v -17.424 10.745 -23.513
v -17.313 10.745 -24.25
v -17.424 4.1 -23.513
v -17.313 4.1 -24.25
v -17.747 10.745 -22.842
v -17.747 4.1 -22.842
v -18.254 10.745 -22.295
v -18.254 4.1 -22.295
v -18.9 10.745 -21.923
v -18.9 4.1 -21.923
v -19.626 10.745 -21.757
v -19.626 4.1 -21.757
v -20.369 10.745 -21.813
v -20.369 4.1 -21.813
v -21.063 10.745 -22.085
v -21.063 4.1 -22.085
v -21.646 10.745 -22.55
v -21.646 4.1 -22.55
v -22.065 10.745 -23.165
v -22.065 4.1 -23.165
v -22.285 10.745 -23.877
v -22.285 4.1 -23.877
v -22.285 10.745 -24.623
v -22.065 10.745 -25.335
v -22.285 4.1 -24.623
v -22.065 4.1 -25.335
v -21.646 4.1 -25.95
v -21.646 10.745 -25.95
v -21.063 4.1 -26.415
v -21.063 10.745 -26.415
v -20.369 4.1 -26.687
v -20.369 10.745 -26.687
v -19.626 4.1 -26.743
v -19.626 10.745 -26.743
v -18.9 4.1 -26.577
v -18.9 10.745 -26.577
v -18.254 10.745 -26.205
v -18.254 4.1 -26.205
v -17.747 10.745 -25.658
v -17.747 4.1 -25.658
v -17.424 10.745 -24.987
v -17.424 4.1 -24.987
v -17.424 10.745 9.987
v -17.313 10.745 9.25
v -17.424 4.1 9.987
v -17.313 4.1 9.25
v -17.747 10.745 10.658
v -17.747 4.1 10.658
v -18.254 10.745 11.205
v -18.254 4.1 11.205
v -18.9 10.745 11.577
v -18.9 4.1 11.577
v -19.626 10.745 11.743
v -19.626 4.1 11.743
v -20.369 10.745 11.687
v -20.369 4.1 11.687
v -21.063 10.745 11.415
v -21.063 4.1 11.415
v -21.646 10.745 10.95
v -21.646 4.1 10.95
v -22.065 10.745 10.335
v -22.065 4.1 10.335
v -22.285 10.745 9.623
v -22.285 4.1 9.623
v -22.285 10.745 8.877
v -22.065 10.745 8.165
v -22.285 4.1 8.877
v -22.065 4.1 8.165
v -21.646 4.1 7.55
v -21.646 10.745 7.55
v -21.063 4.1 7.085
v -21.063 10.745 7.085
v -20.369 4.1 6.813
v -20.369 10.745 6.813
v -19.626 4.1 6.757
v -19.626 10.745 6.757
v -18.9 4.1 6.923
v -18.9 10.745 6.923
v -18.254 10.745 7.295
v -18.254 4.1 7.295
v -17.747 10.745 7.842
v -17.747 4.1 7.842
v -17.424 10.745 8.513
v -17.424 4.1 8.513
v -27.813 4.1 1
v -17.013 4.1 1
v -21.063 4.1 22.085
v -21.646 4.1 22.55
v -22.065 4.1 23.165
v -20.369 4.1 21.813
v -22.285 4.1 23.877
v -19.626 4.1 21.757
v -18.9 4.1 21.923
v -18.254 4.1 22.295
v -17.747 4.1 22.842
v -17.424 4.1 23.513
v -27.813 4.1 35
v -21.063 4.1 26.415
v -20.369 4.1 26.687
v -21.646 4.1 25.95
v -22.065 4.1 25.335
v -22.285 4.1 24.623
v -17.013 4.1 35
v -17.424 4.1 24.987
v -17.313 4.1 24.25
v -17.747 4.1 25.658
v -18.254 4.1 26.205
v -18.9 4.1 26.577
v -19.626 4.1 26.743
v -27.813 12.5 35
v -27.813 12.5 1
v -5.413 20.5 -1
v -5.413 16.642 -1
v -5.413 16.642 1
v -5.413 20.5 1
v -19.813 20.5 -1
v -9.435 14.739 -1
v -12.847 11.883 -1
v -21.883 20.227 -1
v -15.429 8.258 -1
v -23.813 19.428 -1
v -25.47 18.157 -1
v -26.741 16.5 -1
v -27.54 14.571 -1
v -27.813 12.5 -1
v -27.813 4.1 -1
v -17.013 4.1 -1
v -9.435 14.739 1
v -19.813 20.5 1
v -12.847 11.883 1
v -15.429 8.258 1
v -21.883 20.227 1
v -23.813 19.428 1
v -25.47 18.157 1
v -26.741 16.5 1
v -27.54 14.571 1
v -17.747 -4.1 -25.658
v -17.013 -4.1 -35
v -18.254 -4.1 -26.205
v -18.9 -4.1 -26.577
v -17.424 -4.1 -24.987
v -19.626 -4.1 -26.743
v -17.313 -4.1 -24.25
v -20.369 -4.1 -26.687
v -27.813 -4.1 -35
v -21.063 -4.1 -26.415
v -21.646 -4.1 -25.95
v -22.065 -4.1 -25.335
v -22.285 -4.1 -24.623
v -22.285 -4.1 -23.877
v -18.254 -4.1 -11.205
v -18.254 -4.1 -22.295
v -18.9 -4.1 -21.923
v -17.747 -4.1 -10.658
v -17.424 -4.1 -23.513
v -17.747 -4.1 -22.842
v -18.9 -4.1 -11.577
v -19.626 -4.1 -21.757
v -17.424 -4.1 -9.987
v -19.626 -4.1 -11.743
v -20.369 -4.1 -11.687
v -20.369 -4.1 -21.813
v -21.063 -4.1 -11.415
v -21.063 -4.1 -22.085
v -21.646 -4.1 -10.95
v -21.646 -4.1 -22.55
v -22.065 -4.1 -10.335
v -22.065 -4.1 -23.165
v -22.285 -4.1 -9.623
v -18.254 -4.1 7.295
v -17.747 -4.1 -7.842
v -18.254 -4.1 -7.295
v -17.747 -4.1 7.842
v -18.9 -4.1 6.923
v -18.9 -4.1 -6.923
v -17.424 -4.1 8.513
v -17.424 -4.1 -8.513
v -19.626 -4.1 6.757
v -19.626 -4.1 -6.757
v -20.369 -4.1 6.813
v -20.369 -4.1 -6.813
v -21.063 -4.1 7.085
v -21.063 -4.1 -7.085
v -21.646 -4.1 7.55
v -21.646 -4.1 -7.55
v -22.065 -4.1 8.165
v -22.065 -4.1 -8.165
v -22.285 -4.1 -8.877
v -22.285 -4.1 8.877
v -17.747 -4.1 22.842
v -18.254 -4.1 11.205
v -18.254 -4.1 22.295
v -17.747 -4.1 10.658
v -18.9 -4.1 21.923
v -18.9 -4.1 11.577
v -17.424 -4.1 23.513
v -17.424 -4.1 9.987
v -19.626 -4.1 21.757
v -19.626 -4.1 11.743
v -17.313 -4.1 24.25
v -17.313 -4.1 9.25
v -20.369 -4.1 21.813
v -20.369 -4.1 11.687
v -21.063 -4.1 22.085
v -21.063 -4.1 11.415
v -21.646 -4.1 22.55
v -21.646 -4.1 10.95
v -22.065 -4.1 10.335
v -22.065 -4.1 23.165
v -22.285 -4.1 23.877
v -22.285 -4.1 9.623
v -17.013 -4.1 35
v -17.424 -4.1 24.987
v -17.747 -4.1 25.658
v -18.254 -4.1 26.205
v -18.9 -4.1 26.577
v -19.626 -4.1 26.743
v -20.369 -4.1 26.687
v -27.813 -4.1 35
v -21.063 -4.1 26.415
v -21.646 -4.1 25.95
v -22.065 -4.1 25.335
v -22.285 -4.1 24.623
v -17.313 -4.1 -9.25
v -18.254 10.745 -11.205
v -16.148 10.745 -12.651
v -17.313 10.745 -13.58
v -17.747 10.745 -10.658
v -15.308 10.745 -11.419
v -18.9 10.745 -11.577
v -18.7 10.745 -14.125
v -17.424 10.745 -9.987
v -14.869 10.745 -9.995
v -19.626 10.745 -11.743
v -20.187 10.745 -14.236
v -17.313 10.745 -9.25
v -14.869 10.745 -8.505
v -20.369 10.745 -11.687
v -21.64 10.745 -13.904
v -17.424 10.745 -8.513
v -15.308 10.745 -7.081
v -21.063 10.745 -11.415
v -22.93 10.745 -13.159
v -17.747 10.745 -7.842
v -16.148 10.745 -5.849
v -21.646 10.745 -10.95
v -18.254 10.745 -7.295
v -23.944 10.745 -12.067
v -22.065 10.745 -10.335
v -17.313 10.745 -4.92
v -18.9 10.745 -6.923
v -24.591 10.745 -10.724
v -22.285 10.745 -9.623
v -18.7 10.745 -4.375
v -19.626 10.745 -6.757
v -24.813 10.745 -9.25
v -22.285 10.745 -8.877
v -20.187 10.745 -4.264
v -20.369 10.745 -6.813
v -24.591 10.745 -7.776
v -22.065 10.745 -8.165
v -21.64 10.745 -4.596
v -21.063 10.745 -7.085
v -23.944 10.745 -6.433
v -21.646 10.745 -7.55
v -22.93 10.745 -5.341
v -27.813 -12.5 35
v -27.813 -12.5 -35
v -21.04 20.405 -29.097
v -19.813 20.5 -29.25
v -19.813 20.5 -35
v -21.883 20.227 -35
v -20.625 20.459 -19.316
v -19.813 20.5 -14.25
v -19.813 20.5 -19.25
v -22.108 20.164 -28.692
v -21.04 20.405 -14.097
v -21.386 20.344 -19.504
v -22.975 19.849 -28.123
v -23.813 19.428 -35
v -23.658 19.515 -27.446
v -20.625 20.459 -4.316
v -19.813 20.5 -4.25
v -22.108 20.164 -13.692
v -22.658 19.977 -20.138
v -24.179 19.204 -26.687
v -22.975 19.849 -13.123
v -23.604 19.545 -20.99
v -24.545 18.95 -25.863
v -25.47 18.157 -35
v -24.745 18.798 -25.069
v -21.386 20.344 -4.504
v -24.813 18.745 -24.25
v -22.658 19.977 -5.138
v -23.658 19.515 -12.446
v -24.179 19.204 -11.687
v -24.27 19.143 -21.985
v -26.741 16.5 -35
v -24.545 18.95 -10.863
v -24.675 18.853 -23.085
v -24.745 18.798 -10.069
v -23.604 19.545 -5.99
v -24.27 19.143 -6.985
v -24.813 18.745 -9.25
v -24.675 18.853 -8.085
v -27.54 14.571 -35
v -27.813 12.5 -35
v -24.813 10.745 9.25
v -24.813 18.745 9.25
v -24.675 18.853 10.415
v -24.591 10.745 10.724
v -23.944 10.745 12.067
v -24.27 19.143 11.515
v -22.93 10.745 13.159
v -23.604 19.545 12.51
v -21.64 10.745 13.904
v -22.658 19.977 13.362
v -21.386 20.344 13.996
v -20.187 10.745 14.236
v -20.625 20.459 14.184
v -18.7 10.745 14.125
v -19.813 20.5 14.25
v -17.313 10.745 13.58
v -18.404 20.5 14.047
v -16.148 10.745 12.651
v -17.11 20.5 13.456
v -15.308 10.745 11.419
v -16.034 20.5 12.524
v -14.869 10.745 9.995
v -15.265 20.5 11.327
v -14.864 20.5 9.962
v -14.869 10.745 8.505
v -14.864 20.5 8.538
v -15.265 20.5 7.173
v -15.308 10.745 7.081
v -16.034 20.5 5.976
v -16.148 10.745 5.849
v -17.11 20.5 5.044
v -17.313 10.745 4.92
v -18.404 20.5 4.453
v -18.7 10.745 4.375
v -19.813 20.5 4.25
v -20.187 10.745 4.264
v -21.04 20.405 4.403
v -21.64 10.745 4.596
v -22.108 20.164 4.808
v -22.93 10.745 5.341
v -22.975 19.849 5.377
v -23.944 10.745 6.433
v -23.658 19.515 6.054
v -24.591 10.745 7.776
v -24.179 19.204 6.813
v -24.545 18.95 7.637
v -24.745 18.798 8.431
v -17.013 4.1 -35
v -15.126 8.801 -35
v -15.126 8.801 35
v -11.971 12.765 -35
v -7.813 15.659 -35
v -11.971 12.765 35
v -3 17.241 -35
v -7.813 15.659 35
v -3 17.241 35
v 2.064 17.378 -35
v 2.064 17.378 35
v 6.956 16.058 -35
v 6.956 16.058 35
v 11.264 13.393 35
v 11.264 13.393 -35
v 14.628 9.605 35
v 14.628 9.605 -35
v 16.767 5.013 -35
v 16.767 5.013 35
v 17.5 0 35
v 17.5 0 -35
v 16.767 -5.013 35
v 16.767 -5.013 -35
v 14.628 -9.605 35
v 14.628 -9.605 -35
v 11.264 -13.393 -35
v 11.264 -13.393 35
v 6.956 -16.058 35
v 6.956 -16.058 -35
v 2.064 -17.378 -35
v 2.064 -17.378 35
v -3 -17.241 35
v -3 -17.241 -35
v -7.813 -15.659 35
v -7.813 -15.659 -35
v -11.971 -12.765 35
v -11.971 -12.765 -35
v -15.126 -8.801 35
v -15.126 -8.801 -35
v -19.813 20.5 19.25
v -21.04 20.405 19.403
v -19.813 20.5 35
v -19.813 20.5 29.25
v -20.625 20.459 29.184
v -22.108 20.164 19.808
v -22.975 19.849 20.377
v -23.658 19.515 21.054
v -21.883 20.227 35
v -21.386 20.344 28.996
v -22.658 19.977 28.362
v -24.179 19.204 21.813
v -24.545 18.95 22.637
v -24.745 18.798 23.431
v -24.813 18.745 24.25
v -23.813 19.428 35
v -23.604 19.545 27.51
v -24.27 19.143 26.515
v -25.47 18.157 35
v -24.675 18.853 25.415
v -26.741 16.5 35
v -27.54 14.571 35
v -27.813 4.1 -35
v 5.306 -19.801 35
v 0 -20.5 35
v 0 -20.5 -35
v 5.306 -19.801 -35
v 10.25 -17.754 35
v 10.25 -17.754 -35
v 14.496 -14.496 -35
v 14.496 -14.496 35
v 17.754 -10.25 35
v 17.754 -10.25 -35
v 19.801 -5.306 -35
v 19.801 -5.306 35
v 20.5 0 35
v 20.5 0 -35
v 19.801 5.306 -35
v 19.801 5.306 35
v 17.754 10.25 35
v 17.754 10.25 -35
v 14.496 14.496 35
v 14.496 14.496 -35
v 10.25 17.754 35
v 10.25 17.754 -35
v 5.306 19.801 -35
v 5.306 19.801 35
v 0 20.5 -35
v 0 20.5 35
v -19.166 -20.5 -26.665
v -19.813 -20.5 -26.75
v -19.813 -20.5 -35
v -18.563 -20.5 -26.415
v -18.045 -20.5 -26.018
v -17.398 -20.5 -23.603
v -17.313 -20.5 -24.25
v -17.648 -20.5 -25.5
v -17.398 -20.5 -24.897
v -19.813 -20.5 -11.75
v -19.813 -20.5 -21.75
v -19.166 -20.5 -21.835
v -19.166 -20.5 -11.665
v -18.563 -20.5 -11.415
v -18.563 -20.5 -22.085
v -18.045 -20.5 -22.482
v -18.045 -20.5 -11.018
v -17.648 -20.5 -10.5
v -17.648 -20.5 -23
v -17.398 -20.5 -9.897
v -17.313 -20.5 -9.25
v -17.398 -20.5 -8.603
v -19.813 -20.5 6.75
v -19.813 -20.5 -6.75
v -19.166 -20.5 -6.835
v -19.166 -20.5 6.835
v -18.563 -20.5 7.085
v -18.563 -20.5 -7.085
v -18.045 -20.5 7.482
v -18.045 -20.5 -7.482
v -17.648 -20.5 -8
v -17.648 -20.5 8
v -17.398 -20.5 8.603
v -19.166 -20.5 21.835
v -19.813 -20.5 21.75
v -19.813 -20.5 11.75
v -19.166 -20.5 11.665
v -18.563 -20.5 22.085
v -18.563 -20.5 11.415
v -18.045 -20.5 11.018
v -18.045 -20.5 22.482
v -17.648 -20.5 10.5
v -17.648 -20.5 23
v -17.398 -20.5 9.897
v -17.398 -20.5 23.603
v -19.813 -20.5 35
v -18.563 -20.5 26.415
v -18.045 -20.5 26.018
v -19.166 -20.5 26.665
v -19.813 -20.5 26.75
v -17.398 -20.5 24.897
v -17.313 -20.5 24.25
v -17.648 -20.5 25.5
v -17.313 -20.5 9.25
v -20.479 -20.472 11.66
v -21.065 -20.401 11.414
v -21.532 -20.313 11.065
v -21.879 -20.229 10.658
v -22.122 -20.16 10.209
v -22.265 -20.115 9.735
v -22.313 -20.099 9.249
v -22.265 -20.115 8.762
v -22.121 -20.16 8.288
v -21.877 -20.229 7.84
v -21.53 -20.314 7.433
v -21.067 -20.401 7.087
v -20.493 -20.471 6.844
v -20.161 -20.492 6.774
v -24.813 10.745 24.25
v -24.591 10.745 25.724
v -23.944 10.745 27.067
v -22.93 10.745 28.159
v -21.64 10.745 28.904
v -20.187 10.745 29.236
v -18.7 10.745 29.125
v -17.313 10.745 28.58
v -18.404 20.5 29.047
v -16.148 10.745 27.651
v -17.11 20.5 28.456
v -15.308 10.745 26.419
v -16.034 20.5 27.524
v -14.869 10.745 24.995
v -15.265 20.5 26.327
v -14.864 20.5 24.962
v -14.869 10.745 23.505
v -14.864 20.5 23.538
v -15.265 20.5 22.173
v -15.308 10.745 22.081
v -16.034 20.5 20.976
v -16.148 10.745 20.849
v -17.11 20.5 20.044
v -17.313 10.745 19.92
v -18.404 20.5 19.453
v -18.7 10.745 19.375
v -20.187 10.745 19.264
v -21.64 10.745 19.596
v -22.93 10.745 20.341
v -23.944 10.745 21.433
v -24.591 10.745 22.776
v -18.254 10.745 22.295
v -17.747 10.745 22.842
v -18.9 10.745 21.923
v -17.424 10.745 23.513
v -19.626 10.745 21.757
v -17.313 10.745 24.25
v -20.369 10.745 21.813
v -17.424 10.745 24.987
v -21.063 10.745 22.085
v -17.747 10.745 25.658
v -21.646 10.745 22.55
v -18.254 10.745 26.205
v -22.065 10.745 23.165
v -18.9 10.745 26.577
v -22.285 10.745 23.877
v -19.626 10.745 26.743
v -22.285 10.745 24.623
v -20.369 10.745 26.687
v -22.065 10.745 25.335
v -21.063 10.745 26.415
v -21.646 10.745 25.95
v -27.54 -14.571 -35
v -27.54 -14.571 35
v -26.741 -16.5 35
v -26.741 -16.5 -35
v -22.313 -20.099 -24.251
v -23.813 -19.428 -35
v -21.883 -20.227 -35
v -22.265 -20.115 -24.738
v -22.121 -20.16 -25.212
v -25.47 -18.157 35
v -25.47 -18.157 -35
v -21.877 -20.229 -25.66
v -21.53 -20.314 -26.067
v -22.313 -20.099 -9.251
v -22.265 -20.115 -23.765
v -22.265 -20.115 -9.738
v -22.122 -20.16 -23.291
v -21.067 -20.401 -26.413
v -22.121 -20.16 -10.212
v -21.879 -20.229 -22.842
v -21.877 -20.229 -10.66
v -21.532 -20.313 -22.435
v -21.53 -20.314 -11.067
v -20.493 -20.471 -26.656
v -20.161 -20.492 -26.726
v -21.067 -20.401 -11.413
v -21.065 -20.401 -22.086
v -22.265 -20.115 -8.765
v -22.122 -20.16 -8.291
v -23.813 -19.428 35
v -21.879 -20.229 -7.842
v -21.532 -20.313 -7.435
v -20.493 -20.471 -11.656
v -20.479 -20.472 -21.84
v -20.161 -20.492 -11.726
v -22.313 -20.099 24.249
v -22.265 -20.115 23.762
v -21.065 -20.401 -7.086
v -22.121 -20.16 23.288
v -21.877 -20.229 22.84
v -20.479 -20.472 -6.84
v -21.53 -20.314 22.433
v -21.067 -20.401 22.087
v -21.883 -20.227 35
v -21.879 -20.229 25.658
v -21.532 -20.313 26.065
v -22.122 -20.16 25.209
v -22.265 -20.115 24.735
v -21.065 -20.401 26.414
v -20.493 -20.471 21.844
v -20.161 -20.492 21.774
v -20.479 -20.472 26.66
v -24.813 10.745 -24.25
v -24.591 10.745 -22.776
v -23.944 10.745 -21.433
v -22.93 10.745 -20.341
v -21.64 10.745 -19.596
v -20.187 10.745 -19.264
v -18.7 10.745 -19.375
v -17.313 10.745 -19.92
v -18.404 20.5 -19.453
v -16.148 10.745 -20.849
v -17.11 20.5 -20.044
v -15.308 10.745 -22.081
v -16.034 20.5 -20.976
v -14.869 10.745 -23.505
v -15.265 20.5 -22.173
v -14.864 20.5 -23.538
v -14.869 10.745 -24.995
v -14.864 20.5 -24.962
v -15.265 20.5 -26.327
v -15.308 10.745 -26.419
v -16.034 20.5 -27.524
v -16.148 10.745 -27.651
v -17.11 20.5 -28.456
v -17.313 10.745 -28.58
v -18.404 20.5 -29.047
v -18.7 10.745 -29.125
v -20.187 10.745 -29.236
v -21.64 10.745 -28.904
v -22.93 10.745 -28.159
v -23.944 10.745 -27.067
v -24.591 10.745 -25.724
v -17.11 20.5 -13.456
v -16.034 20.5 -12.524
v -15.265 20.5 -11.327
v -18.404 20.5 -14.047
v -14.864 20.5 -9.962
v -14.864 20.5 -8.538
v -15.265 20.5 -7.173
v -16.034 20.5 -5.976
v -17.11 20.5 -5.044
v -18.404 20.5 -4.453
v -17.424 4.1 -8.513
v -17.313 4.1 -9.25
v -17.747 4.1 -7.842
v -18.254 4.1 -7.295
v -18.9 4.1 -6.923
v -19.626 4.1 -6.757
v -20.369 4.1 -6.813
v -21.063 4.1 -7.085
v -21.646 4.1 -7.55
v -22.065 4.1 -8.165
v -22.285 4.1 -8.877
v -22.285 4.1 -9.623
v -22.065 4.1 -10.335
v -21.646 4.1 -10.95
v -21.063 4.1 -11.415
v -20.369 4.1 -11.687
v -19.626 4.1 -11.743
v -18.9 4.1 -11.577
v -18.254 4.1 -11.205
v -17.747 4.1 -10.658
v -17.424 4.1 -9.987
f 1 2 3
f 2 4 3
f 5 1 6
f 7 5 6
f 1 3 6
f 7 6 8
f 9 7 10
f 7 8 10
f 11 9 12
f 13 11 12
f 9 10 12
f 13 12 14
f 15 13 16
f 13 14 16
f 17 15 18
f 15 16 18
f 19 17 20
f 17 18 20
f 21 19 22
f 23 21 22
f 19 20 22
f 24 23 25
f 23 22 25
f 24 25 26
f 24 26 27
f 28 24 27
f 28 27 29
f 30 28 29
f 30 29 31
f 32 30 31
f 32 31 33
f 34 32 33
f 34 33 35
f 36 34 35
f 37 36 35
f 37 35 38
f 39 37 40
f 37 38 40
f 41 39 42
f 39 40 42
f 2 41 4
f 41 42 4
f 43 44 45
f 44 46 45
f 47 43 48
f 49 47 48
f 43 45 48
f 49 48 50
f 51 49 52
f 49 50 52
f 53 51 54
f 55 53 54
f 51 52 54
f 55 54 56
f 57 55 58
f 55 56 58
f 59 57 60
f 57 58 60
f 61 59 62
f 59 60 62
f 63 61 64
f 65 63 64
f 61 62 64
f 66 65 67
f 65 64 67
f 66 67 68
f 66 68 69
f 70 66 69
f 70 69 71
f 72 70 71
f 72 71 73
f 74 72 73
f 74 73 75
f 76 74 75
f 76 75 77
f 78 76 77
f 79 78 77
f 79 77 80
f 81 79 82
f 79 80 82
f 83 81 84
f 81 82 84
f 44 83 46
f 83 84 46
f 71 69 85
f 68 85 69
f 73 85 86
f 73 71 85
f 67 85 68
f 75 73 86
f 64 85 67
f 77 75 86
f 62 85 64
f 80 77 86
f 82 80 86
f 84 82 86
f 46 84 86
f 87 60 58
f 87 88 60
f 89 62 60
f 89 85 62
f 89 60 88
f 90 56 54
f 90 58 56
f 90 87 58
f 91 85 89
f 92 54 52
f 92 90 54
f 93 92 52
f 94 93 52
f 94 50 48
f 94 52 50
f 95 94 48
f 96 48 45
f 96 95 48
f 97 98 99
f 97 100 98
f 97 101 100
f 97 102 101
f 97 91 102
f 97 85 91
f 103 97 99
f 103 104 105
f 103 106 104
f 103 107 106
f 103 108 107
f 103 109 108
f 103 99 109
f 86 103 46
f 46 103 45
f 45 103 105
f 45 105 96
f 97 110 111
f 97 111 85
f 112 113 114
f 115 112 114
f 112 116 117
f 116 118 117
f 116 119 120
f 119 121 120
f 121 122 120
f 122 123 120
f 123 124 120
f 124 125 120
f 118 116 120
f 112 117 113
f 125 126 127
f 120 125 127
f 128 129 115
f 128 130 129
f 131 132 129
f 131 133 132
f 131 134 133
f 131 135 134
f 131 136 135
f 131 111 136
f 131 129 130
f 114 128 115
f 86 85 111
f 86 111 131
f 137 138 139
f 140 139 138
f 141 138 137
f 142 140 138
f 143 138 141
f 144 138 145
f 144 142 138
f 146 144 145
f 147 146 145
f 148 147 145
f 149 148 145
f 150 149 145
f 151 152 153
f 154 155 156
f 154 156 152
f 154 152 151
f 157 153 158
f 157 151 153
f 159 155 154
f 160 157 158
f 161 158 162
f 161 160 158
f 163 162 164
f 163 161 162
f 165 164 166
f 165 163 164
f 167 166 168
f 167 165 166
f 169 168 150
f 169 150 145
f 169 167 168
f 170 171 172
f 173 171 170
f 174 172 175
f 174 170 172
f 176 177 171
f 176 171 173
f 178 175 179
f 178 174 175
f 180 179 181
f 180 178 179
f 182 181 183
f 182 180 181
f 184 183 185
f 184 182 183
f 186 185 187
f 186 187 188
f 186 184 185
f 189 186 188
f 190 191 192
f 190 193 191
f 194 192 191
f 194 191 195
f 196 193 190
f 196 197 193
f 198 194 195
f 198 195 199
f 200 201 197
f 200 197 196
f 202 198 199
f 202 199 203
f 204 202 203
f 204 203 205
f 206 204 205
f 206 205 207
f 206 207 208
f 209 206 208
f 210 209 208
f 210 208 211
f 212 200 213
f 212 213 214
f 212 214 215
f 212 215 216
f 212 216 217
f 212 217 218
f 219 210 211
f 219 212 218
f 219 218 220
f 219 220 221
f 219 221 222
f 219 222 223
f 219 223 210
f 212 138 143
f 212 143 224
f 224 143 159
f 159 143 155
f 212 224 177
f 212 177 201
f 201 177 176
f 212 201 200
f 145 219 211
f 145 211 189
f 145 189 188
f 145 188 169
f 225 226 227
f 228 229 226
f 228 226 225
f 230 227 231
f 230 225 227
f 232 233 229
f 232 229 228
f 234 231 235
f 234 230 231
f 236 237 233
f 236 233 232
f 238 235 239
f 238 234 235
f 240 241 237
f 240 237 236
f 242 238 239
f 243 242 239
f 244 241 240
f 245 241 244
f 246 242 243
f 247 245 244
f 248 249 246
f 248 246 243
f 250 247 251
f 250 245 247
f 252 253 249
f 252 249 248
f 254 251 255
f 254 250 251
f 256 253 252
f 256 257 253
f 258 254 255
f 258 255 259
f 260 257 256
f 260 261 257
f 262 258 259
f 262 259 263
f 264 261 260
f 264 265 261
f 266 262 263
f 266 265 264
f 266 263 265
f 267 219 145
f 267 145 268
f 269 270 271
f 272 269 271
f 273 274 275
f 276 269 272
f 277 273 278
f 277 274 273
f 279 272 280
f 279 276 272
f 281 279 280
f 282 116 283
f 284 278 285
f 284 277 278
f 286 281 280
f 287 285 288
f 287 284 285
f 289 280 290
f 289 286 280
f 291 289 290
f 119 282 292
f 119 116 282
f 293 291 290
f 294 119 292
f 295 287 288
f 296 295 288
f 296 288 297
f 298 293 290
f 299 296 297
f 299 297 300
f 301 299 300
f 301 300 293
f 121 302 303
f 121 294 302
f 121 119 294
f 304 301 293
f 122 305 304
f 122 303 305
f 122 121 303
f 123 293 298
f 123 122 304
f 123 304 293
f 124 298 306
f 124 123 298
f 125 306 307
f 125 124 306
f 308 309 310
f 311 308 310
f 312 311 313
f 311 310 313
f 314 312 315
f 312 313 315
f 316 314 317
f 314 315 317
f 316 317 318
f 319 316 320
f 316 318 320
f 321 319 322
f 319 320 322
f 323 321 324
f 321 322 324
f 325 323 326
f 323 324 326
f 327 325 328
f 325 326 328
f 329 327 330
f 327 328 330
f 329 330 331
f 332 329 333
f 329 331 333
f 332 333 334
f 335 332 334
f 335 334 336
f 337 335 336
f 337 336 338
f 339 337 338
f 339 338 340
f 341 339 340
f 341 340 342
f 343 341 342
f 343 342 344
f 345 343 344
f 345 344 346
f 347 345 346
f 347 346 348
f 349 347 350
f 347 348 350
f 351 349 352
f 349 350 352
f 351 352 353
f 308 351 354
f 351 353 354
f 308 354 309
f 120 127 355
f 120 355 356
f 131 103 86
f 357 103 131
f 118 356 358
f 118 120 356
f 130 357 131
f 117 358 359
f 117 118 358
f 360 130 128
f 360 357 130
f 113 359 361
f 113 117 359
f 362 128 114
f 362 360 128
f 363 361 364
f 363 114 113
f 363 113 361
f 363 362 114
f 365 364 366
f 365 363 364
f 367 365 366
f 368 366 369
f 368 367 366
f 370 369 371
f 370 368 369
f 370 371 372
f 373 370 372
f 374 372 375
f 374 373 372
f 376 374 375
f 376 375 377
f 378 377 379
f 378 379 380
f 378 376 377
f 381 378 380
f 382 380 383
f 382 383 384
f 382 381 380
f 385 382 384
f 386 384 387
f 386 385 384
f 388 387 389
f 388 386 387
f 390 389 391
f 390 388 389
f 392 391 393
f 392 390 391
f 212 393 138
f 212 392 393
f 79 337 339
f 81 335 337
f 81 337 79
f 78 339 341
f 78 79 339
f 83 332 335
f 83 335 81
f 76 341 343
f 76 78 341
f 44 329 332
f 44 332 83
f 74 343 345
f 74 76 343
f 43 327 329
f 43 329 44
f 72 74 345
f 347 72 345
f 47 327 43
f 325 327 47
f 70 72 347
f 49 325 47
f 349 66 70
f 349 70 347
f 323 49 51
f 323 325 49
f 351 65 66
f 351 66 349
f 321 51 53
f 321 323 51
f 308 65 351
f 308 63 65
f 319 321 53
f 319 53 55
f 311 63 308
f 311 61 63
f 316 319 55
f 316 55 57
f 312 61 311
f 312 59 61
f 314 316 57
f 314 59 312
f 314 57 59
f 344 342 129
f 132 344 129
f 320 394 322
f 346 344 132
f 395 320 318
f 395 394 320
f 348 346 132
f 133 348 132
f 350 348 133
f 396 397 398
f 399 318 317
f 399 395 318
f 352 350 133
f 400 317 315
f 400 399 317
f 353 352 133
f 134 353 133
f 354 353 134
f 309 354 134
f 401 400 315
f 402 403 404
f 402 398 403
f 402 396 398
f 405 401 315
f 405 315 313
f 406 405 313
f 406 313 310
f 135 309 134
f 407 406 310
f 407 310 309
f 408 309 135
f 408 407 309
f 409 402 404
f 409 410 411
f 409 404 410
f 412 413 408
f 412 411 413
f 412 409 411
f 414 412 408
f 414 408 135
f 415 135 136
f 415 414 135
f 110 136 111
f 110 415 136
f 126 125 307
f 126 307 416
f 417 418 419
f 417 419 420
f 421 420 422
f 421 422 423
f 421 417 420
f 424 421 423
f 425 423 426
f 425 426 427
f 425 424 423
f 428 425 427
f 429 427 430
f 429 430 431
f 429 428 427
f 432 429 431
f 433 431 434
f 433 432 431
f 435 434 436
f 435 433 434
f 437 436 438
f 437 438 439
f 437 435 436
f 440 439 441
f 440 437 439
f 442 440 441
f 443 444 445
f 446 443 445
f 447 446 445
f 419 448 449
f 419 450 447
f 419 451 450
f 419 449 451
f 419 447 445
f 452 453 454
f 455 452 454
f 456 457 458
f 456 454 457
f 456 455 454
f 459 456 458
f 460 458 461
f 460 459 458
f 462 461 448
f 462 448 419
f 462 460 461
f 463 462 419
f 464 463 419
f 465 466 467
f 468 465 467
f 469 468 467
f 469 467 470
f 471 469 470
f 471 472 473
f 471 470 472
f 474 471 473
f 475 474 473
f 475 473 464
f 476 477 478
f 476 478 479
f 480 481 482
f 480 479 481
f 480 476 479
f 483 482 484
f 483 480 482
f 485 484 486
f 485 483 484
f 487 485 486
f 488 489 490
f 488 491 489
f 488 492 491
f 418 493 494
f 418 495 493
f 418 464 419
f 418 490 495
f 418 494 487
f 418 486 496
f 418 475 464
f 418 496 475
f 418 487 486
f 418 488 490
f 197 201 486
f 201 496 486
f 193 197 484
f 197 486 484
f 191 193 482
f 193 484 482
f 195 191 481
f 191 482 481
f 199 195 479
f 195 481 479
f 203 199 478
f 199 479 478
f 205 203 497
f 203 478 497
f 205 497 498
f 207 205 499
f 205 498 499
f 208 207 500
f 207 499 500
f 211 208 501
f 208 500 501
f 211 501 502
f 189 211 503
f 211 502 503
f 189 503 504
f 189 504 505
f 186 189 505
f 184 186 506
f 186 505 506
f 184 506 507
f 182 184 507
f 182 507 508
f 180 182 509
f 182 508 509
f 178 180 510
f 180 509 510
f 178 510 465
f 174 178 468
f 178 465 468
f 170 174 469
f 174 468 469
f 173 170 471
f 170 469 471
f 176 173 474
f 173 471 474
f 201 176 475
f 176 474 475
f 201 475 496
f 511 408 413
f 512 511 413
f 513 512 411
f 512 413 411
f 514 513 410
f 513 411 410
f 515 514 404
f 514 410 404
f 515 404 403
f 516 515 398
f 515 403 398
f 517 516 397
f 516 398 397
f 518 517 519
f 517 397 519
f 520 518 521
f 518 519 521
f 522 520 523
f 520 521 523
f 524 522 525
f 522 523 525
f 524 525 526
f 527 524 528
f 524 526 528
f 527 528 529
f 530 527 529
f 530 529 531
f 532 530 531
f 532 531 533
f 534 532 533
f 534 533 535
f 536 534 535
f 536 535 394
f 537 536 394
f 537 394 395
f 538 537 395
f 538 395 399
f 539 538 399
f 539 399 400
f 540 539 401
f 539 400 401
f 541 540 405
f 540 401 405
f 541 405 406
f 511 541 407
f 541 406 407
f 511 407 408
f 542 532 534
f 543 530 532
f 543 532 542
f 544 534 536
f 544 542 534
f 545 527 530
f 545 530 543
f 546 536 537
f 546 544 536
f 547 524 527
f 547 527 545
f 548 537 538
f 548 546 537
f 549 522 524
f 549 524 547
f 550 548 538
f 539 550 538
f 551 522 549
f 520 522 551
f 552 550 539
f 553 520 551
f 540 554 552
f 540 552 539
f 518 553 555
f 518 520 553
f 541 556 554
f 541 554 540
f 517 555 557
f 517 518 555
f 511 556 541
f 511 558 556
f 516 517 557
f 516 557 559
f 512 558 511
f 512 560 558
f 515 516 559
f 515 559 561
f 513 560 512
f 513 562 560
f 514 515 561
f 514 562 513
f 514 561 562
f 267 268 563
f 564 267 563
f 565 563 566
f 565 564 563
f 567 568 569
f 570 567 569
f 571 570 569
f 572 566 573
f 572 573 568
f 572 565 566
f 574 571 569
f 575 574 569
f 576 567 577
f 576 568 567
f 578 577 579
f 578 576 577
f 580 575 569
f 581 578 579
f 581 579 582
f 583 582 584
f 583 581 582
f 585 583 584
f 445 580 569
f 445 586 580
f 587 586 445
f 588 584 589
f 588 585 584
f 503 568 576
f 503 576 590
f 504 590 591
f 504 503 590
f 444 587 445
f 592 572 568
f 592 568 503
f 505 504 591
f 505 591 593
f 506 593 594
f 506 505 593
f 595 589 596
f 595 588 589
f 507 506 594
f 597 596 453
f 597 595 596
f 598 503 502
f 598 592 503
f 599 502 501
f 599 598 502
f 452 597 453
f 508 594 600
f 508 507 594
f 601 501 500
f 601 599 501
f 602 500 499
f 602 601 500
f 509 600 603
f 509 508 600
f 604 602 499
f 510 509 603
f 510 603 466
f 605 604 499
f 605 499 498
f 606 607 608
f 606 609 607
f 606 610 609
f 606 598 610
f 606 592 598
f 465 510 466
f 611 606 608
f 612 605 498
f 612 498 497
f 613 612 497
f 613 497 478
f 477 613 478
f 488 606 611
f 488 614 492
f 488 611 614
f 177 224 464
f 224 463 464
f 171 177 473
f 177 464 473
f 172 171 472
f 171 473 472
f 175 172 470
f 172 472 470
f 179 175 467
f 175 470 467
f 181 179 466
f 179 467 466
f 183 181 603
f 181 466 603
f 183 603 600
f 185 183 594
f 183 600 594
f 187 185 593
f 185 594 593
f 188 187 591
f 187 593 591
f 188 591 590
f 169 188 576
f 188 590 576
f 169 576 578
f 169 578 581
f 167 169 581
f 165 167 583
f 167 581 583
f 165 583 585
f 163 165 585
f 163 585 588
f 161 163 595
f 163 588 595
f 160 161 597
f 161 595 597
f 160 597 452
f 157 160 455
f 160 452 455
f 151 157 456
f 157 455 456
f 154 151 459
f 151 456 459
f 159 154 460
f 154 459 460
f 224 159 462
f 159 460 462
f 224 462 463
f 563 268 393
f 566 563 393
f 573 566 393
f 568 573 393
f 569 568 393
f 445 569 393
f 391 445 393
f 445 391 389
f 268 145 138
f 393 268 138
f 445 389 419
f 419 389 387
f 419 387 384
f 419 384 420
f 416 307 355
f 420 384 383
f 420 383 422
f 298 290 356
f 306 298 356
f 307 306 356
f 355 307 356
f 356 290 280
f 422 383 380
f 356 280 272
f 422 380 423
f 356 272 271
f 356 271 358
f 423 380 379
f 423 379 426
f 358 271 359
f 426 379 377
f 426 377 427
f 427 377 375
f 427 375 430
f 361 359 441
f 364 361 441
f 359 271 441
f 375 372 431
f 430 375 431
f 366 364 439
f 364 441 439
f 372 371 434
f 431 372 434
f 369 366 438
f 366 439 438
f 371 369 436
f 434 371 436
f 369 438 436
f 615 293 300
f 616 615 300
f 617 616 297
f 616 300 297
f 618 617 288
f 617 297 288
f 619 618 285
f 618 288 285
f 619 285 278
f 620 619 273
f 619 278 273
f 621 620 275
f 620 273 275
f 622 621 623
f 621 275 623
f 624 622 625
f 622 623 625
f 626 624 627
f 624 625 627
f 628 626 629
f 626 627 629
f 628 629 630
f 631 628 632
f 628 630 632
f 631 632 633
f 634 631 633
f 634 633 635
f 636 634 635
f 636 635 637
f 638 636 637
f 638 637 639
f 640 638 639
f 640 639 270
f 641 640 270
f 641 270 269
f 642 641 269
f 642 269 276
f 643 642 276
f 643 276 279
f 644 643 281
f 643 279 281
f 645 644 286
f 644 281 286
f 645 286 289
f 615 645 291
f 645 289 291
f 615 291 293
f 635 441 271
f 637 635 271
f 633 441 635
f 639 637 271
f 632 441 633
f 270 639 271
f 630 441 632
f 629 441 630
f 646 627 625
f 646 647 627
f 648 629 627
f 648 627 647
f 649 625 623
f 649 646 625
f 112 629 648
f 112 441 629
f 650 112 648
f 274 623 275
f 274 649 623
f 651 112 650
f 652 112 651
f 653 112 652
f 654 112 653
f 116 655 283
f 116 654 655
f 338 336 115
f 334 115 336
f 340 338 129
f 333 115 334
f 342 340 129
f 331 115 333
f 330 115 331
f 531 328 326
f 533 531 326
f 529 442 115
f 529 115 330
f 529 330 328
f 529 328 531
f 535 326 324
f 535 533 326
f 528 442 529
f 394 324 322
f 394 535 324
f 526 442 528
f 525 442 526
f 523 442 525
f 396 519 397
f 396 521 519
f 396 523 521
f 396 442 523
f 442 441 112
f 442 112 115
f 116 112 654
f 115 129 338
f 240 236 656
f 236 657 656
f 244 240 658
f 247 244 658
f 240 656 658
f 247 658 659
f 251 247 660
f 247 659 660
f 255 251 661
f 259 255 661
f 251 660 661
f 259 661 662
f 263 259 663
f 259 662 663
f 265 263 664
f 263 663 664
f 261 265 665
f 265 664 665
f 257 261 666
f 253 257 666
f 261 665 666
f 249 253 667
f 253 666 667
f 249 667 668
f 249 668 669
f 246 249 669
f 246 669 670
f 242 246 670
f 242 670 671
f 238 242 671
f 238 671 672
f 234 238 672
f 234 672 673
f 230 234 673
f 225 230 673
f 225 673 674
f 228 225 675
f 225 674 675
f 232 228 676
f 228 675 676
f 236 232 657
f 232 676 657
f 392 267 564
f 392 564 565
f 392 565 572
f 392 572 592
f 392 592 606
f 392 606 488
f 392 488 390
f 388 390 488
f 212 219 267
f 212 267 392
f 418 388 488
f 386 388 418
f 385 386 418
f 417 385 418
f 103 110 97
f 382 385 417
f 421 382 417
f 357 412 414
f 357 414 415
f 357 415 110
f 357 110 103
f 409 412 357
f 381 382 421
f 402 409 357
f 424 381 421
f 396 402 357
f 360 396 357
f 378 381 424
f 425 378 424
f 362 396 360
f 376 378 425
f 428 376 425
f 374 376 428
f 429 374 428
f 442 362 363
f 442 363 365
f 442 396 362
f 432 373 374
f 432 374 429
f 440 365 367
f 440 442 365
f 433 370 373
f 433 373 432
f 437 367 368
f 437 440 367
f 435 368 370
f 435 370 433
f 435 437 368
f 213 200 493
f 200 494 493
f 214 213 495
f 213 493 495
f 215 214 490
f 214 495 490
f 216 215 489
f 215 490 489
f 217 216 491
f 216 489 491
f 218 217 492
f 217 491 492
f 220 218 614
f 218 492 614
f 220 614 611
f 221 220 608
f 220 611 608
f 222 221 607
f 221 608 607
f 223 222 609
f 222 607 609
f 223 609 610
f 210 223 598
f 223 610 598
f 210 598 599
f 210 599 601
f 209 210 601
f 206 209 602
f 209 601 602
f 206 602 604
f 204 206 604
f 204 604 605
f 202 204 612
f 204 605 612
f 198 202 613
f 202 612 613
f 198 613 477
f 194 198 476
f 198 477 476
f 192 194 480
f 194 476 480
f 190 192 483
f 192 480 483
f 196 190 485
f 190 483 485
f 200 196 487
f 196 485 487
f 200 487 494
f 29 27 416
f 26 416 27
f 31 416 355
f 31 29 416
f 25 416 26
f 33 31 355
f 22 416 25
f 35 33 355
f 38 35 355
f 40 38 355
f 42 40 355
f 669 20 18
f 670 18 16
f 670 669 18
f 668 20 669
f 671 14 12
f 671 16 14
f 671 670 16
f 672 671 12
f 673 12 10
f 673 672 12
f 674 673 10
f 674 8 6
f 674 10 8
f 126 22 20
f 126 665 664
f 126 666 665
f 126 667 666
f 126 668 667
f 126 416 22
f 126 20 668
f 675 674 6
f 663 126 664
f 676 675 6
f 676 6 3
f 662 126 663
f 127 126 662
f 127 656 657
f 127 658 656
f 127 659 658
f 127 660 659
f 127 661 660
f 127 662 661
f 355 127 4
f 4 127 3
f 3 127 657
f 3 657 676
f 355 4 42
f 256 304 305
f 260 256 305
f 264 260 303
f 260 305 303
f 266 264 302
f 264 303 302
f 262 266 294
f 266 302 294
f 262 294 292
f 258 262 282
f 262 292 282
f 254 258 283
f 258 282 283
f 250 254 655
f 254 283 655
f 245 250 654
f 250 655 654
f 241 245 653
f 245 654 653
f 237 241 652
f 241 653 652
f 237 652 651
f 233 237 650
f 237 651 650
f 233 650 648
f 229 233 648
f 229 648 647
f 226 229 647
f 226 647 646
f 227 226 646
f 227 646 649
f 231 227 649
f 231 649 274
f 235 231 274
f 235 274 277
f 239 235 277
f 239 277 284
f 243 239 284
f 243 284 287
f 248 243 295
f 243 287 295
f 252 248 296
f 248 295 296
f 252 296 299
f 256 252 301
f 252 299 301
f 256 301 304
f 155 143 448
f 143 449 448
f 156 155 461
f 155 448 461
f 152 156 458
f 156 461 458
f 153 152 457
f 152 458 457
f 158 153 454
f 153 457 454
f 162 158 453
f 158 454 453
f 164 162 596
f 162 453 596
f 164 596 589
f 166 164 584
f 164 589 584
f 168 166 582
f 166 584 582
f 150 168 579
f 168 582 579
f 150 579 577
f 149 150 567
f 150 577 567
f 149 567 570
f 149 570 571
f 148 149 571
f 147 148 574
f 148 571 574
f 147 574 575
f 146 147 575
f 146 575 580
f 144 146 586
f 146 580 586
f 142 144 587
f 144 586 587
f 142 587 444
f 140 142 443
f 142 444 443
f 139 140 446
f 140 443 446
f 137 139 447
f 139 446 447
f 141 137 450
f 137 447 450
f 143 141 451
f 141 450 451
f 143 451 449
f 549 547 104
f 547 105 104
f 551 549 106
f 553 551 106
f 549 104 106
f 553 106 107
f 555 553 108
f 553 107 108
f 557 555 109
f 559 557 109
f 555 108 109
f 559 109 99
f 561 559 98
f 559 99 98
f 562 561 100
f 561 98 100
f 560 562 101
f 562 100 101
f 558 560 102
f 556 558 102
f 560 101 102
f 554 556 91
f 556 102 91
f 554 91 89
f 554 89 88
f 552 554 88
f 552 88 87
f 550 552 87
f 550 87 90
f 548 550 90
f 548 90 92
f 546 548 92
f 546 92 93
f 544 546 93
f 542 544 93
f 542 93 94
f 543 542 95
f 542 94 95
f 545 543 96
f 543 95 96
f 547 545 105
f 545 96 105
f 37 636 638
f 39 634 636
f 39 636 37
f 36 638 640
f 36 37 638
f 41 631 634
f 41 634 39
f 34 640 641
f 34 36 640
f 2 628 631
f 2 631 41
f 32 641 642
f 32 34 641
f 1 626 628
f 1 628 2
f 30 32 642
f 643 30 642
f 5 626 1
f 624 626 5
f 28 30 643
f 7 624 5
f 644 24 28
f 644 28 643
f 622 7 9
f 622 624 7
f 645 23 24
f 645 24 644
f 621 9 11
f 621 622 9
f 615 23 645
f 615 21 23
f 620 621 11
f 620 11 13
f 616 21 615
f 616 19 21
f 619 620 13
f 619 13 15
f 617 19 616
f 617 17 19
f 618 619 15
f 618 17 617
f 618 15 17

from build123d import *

# Parameters (mm, degrees)
F1_DEPTH       = 35
F3_D           = 5
F3_START       = 1.7550021
F3_CBORE_D     = 10
F3_CBORE_DEPTH = 8
F4_W           = 22.4
F4_H           = 2
F5_DEPTH       = 25


with BuildPart() as f1:
    # F0 (on Top) → F1 (new body, symmetric)
    with BuildSketch(Plane.XY):
        with BuildLine():
            ThreePointArc((-17.0129362545, 4.1), (17.5, 0), (-17.0129362545, -4.1))
            Line((-17.0129362545, -4.1), (-27.8129362545, -4.1))
            Line((-27.8129362545, -4.1), (-27.8129362545, -12.5))
            ThreePointArc((-27.8129362545, -12.5), (-25.469790504, -18.1568542495), (-19.8129362545, -20.5))
            Line((-19.8129362545, -20.5), (0, -20.5))
            ThreePointArc((0, -20.5), (20.5, 0), (0, 20.5))
            Line((0, 20.5), (-19.8129362545, 20.5))
            ThreePointArc((-19.8129362545, 20.5), (-25.469790504, 18.1568542495), (-27.8129362545, 12.5))
            Line((-27.8129362545, 12.5), (-27.8129362545, 4.1))
            Line((-27.8129362545, 4.1), (-17.0129362545, 4.1))
        make_face()
    extrude(amount=F1_DEPTH, both=True)

    # F3 (through all)
    # its depths count from where the whole tool has entered the part; down to there all is cleared
    with Locations(Plane(origin=(0, 20.5, 0), x_dir=(-1, 0, 0), z_dir=(0, 1, 0)).offset(-F3_START)):
        with Locations((19.8129362545, -24.25), (19.8129362545, -9.25), (19.8129362545, 9.25), (19.8129362545, 24.25)):
            CounterBoreHole(F3_D / 2, F3_CBORE_D / 2, F3_CBORE_DEPTH)

    # F4 (on Front) → F5 (cut)
    with BuildSketch(Plane.XZ):
        with Locations((-16.6129362545, 0)):
            Rectangle(F4_W, F4_H)
    extrude(amount=-F5_DEPTH, mode=Mode.SUBTRACT)


solid = f1.part
